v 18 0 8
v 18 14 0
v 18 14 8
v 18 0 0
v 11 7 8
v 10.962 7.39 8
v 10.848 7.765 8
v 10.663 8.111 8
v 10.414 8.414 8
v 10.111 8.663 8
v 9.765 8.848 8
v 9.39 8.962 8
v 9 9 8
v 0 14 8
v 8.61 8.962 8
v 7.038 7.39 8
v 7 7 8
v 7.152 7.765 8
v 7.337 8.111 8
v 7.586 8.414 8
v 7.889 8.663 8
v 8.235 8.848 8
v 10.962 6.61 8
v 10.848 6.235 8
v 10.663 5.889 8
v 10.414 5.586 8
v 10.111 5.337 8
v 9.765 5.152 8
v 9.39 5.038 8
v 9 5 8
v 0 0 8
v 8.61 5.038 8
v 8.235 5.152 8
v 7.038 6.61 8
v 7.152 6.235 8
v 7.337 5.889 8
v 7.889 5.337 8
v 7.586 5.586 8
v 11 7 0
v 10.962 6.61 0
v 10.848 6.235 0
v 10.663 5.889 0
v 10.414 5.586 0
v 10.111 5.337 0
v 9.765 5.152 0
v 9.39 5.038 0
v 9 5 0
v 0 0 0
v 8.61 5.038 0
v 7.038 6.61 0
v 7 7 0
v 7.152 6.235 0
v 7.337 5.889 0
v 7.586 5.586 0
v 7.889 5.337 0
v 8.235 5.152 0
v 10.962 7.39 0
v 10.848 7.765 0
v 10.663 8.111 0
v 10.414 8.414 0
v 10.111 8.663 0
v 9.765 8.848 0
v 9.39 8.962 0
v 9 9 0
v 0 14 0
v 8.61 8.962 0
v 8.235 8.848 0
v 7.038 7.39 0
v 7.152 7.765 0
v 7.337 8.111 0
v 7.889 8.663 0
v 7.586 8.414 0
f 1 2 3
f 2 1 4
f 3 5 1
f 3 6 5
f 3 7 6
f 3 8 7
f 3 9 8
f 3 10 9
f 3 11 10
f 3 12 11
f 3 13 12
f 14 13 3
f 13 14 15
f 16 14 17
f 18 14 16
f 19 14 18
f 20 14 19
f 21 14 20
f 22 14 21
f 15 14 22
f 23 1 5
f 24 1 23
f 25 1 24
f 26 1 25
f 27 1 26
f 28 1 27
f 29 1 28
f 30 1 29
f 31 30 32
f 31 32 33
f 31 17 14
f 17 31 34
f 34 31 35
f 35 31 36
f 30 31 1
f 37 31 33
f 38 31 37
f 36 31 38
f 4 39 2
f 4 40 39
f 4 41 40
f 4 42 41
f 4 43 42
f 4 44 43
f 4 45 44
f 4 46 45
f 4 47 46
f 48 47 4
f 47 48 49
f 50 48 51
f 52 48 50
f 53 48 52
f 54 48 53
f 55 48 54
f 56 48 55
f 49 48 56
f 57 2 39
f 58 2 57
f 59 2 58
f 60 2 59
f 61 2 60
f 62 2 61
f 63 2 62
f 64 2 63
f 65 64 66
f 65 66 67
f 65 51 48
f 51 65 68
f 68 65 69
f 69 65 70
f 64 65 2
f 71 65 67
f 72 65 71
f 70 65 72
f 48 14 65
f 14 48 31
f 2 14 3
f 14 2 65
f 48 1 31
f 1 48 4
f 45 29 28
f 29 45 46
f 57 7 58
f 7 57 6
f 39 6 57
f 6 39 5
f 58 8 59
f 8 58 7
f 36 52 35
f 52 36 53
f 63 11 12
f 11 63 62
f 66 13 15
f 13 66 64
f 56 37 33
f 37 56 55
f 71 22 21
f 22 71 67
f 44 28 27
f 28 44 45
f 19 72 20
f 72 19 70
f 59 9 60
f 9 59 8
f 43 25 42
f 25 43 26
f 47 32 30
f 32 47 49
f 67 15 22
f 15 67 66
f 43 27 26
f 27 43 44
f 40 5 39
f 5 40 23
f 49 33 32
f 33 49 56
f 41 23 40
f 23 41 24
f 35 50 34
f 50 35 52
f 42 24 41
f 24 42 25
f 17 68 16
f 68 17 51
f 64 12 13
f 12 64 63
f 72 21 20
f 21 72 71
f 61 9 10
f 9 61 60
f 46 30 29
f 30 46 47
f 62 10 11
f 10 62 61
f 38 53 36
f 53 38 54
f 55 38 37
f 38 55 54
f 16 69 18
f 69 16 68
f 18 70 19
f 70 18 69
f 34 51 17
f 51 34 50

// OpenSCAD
$fn = 32;

// ----------------------------------------------------------------------
// Micro pad: drilled pad, 5-20 mm class
// ----------------------------------------------------------------------

// --- parameters (mm) ---
pad_l = 18;               // pad length, X
pad_w = 14;               // pad width, Y
pad_t = 8;                // pad thickness, Z
hole_d = 4;               // through hole diameter
fit_tol = 0.05;           // tolerance for press fits, mm
free_tol = 0.3;           // tolerance for clearance fits, mm

difference() {
  cube([pad_l, pad_w, pad_t]);
  translate([pad_l / 2, pad_w / 2, -1])
    cylinder(h = pad_t + 2, d = hole_d);
}
